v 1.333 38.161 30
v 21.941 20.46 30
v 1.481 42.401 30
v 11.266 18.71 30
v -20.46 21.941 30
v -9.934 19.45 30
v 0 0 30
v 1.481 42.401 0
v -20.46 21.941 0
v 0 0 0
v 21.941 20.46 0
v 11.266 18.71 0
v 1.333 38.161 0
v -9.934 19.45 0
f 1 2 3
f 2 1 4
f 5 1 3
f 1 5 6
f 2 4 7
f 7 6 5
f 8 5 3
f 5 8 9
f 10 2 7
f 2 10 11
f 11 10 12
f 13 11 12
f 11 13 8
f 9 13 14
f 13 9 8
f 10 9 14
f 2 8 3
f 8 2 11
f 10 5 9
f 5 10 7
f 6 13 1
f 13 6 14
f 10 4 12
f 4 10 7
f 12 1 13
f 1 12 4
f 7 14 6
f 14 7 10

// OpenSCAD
rotate([0,0,-2])
rotate([0,-90,0]){
    difference(){
        rotate([-45,0,0]) {
            cube([30, 30, 30]);
        }
        scale([1,0.9,0.5]) {
            rotate([-45,0,0]) {
                cube([30, 30, 30]);
            }
        }
    }
}
